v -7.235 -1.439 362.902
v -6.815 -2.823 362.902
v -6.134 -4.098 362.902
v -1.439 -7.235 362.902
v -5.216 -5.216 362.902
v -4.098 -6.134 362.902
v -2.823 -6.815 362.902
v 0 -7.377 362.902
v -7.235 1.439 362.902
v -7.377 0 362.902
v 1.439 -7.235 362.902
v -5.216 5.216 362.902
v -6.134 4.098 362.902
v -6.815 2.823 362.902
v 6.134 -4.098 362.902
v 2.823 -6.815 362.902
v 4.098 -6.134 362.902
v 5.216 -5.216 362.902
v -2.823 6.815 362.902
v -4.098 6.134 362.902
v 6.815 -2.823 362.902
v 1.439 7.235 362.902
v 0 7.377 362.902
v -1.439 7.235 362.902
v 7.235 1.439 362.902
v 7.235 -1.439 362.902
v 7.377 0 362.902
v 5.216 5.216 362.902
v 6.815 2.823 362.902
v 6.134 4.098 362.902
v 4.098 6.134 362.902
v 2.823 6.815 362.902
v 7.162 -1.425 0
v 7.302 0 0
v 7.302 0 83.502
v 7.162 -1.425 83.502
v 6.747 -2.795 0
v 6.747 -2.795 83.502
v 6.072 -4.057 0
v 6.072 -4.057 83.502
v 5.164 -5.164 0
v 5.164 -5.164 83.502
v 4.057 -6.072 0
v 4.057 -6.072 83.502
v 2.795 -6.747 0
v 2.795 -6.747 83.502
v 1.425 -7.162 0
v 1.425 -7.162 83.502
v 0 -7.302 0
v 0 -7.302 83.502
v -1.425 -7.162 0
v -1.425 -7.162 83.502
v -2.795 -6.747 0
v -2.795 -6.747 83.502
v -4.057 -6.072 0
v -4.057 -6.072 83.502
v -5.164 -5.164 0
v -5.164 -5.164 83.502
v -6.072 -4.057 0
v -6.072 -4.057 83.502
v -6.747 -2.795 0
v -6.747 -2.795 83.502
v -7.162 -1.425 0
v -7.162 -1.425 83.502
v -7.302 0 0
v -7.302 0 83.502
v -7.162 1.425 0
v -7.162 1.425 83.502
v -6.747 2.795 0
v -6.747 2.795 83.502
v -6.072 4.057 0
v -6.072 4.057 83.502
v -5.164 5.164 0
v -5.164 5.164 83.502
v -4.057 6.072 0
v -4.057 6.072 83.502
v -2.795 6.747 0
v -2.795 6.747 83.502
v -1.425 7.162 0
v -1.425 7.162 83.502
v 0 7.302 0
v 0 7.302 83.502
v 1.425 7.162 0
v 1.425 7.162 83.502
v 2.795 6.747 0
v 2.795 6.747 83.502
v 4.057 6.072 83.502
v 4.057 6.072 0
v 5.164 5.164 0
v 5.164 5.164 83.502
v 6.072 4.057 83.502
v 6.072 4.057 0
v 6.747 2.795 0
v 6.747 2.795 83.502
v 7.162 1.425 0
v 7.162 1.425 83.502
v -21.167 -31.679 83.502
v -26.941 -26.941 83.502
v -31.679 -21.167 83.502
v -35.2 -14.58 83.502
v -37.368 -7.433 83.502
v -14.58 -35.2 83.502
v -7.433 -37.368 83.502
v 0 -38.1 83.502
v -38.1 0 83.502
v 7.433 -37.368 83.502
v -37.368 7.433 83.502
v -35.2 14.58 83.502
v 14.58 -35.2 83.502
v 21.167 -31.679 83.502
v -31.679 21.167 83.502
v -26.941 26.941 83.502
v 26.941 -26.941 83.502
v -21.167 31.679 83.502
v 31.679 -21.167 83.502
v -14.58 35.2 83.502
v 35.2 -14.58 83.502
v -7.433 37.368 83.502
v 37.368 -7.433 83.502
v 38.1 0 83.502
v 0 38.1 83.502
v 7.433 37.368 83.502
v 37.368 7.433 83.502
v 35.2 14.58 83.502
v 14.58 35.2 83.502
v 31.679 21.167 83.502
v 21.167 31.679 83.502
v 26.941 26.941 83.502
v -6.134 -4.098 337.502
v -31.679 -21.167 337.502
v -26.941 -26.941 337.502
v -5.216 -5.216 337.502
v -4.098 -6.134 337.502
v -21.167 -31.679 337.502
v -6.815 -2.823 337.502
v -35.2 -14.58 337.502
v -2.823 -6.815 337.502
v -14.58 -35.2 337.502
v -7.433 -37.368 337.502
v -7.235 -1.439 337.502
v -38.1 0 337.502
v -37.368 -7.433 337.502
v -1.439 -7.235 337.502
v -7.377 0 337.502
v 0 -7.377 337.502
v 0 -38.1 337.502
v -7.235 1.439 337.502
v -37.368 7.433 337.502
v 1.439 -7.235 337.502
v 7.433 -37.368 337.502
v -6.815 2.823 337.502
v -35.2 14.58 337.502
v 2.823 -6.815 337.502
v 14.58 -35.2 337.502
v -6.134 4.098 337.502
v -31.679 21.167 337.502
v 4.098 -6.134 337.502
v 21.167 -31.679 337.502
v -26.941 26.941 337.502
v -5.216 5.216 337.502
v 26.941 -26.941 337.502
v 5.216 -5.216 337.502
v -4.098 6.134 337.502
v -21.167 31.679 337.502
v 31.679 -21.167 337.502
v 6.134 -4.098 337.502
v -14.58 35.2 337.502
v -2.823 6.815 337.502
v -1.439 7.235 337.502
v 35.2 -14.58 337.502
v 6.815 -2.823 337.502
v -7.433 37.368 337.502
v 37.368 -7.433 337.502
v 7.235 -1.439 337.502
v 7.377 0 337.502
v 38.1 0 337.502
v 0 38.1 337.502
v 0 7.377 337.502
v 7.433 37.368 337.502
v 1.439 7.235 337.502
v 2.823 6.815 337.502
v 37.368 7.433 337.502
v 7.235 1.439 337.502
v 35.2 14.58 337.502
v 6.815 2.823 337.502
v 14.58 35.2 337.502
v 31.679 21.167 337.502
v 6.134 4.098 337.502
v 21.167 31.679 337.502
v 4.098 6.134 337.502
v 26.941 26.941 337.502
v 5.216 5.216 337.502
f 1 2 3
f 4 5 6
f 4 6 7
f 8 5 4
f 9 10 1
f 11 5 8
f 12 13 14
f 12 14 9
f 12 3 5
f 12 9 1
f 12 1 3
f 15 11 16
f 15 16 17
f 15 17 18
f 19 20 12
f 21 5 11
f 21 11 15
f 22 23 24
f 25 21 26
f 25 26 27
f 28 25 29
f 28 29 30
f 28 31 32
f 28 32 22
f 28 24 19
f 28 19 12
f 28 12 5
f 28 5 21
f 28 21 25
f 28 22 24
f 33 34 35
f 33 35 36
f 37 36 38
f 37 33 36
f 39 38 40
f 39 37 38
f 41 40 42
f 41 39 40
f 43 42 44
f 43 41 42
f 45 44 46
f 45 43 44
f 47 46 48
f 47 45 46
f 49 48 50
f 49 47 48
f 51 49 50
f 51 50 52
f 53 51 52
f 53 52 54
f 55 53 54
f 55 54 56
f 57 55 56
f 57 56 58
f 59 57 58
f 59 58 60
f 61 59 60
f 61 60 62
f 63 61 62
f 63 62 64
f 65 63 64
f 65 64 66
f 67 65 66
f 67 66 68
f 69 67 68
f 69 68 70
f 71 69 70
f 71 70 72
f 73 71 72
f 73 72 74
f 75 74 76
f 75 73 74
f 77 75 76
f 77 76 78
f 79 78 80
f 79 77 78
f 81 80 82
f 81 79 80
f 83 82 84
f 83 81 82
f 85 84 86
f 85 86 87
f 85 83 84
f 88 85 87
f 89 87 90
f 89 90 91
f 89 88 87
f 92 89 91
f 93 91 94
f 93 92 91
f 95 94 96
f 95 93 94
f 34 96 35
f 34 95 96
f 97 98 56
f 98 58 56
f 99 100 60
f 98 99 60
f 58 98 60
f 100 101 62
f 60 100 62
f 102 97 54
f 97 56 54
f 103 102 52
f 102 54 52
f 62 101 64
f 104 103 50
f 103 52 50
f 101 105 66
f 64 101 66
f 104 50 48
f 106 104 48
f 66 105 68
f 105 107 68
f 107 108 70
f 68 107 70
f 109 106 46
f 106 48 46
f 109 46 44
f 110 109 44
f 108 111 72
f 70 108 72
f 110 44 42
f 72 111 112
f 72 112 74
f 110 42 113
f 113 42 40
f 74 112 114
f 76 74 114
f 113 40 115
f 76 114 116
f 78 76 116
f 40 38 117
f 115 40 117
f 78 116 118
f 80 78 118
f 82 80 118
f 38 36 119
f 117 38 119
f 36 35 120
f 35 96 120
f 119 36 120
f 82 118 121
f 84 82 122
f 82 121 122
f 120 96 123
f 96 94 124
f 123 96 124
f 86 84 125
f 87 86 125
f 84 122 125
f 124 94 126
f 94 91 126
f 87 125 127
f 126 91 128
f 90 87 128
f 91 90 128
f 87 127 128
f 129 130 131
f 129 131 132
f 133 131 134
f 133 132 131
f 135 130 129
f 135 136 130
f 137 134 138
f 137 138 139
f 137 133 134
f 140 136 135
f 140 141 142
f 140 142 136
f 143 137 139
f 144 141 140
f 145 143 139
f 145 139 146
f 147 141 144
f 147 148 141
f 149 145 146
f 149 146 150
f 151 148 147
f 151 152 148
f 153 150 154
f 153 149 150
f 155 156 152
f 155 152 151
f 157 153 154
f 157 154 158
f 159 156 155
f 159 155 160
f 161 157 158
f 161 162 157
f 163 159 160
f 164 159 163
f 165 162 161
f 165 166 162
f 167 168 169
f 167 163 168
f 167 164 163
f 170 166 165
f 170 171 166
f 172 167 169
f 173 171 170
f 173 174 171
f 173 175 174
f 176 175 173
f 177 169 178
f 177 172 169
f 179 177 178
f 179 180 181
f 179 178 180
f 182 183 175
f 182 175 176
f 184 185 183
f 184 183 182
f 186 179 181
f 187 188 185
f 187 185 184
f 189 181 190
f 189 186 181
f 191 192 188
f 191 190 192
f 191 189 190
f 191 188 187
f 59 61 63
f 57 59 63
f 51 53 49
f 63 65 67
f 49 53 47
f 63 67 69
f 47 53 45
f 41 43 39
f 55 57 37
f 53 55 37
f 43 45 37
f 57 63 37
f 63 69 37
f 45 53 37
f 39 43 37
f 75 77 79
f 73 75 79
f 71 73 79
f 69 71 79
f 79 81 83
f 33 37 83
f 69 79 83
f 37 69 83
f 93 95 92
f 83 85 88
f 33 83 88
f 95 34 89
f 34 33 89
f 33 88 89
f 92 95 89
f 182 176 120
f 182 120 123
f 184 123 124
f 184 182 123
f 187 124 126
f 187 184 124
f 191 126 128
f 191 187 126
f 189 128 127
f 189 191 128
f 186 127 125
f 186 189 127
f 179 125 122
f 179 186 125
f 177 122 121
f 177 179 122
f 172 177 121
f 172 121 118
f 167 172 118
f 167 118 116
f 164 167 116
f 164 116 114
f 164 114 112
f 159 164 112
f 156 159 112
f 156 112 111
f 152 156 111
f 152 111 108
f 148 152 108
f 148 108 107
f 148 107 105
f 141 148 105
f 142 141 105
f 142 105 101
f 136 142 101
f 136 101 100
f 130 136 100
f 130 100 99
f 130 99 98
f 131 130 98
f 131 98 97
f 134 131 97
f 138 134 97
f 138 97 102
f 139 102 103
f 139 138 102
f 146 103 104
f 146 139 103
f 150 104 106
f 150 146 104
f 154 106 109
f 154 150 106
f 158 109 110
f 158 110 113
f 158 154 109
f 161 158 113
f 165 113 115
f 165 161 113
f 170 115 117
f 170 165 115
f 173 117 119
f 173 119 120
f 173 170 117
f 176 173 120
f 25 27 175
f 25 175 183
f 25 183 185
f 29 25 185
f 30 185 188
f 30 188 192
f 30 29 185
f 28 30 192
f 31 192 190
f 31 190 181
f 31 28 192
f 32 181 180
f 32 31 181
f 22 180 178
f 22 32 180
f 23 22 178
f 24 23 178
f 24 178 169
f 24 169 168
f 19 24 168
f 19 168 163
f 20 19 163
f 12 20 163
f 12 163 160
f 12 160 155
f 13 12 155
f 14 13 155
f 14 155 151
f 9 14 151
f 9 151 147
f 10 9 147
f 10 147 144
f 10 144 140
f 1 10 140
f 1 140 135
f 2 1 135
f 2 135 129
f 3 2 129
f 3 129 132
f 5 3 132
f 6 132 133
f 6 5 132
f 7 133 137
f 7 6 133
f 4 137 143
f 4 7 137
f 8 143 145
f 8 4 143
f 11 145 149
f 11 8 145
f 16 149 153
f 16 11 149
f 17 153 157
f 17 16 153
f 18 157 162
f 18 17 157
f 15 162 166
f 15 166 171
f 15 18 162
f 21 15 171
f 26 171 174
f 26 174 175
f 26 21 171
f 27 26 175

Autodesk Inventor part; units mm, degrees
ref_plane "YZ Plane" through (0, 0, 0) normal (1, 0, 0) x (0, 1, 0)
ref_plane "XZ Plane" through (0, 0, 0) normal (0, 1, 0) x (-1, 0, 0)
ref_plane "XY Plane" through (0, 0, 0) normal (0, 0, 1) x (1, 0, 0)
sketch "Sketch1" plane through (0, 0, 0) normal (0, 0, 1) x (1, 0, 0)
  circle A0 centre (0, 0) radius 7.3025
  dimension "d0" = 14.605
extrude "Extrusion1" add sketch "Sketch1" along normal blind 421.005
sketch "Sketch2" plane through (0, 0, 421.005) normal (0, 0, 1) x (1, 0, 0)
  circle A0 centre (0, 0) radius 9.017
  circle A1 centre (0, 0) radius 12.7
  dimension "d3" = 18.034
  dimension "d4" = 25.4
extrude "Extrusion2" add sketch "Sketch2" against normal blind 457.2
sketch "Sketch3" plane through (0, 0, 421.005) normal (0, 0, 1) x (1, 0, 0)
  circle A0 centre (0, 0) radius 7.3025
  circle A1 centre (0, 0) radius 12.7
  circle A2 centre (0, 0) radius 8.9258
extrude "Extrusion3" cut sketch "Sketch3" against normal blind 508 contours A1
sketch "Sketch5" plane through (0, 0, 421.005) normal (0, 0, 1) x (1, 0, 0)
  circle A0 centre (0, 0) radius 38.1
  dimension "d12" = 76.2
extrude "Extrusion5" add sketch "Sketch5" against normal blind 337.5025
sketch "Sketch7" plane through (0, 0, 421.005) normal (0, 0, 1) x (1, 0, 0)
  circle A0 centre (0, 0) radius 7.3768
  circle A1 centre (0, 0) radius 38.1
extrude "Extrusion6" cut sketch "Sketch7" against normal blind 83.5025
sketch "Sketch9" plane through (0, 0, 421.005) normal (0, 0, 1) x (1, 0, 0)
  circle A0 centre (0, 0) radius 7.3025
  circle A1 centre (0, 0) radius 10.3013
extrude "Extrusion7" cut sketch "Sketch9" against normal blind 58.1025 contours A0 | A1
properties part number "Conveyor Axle"
